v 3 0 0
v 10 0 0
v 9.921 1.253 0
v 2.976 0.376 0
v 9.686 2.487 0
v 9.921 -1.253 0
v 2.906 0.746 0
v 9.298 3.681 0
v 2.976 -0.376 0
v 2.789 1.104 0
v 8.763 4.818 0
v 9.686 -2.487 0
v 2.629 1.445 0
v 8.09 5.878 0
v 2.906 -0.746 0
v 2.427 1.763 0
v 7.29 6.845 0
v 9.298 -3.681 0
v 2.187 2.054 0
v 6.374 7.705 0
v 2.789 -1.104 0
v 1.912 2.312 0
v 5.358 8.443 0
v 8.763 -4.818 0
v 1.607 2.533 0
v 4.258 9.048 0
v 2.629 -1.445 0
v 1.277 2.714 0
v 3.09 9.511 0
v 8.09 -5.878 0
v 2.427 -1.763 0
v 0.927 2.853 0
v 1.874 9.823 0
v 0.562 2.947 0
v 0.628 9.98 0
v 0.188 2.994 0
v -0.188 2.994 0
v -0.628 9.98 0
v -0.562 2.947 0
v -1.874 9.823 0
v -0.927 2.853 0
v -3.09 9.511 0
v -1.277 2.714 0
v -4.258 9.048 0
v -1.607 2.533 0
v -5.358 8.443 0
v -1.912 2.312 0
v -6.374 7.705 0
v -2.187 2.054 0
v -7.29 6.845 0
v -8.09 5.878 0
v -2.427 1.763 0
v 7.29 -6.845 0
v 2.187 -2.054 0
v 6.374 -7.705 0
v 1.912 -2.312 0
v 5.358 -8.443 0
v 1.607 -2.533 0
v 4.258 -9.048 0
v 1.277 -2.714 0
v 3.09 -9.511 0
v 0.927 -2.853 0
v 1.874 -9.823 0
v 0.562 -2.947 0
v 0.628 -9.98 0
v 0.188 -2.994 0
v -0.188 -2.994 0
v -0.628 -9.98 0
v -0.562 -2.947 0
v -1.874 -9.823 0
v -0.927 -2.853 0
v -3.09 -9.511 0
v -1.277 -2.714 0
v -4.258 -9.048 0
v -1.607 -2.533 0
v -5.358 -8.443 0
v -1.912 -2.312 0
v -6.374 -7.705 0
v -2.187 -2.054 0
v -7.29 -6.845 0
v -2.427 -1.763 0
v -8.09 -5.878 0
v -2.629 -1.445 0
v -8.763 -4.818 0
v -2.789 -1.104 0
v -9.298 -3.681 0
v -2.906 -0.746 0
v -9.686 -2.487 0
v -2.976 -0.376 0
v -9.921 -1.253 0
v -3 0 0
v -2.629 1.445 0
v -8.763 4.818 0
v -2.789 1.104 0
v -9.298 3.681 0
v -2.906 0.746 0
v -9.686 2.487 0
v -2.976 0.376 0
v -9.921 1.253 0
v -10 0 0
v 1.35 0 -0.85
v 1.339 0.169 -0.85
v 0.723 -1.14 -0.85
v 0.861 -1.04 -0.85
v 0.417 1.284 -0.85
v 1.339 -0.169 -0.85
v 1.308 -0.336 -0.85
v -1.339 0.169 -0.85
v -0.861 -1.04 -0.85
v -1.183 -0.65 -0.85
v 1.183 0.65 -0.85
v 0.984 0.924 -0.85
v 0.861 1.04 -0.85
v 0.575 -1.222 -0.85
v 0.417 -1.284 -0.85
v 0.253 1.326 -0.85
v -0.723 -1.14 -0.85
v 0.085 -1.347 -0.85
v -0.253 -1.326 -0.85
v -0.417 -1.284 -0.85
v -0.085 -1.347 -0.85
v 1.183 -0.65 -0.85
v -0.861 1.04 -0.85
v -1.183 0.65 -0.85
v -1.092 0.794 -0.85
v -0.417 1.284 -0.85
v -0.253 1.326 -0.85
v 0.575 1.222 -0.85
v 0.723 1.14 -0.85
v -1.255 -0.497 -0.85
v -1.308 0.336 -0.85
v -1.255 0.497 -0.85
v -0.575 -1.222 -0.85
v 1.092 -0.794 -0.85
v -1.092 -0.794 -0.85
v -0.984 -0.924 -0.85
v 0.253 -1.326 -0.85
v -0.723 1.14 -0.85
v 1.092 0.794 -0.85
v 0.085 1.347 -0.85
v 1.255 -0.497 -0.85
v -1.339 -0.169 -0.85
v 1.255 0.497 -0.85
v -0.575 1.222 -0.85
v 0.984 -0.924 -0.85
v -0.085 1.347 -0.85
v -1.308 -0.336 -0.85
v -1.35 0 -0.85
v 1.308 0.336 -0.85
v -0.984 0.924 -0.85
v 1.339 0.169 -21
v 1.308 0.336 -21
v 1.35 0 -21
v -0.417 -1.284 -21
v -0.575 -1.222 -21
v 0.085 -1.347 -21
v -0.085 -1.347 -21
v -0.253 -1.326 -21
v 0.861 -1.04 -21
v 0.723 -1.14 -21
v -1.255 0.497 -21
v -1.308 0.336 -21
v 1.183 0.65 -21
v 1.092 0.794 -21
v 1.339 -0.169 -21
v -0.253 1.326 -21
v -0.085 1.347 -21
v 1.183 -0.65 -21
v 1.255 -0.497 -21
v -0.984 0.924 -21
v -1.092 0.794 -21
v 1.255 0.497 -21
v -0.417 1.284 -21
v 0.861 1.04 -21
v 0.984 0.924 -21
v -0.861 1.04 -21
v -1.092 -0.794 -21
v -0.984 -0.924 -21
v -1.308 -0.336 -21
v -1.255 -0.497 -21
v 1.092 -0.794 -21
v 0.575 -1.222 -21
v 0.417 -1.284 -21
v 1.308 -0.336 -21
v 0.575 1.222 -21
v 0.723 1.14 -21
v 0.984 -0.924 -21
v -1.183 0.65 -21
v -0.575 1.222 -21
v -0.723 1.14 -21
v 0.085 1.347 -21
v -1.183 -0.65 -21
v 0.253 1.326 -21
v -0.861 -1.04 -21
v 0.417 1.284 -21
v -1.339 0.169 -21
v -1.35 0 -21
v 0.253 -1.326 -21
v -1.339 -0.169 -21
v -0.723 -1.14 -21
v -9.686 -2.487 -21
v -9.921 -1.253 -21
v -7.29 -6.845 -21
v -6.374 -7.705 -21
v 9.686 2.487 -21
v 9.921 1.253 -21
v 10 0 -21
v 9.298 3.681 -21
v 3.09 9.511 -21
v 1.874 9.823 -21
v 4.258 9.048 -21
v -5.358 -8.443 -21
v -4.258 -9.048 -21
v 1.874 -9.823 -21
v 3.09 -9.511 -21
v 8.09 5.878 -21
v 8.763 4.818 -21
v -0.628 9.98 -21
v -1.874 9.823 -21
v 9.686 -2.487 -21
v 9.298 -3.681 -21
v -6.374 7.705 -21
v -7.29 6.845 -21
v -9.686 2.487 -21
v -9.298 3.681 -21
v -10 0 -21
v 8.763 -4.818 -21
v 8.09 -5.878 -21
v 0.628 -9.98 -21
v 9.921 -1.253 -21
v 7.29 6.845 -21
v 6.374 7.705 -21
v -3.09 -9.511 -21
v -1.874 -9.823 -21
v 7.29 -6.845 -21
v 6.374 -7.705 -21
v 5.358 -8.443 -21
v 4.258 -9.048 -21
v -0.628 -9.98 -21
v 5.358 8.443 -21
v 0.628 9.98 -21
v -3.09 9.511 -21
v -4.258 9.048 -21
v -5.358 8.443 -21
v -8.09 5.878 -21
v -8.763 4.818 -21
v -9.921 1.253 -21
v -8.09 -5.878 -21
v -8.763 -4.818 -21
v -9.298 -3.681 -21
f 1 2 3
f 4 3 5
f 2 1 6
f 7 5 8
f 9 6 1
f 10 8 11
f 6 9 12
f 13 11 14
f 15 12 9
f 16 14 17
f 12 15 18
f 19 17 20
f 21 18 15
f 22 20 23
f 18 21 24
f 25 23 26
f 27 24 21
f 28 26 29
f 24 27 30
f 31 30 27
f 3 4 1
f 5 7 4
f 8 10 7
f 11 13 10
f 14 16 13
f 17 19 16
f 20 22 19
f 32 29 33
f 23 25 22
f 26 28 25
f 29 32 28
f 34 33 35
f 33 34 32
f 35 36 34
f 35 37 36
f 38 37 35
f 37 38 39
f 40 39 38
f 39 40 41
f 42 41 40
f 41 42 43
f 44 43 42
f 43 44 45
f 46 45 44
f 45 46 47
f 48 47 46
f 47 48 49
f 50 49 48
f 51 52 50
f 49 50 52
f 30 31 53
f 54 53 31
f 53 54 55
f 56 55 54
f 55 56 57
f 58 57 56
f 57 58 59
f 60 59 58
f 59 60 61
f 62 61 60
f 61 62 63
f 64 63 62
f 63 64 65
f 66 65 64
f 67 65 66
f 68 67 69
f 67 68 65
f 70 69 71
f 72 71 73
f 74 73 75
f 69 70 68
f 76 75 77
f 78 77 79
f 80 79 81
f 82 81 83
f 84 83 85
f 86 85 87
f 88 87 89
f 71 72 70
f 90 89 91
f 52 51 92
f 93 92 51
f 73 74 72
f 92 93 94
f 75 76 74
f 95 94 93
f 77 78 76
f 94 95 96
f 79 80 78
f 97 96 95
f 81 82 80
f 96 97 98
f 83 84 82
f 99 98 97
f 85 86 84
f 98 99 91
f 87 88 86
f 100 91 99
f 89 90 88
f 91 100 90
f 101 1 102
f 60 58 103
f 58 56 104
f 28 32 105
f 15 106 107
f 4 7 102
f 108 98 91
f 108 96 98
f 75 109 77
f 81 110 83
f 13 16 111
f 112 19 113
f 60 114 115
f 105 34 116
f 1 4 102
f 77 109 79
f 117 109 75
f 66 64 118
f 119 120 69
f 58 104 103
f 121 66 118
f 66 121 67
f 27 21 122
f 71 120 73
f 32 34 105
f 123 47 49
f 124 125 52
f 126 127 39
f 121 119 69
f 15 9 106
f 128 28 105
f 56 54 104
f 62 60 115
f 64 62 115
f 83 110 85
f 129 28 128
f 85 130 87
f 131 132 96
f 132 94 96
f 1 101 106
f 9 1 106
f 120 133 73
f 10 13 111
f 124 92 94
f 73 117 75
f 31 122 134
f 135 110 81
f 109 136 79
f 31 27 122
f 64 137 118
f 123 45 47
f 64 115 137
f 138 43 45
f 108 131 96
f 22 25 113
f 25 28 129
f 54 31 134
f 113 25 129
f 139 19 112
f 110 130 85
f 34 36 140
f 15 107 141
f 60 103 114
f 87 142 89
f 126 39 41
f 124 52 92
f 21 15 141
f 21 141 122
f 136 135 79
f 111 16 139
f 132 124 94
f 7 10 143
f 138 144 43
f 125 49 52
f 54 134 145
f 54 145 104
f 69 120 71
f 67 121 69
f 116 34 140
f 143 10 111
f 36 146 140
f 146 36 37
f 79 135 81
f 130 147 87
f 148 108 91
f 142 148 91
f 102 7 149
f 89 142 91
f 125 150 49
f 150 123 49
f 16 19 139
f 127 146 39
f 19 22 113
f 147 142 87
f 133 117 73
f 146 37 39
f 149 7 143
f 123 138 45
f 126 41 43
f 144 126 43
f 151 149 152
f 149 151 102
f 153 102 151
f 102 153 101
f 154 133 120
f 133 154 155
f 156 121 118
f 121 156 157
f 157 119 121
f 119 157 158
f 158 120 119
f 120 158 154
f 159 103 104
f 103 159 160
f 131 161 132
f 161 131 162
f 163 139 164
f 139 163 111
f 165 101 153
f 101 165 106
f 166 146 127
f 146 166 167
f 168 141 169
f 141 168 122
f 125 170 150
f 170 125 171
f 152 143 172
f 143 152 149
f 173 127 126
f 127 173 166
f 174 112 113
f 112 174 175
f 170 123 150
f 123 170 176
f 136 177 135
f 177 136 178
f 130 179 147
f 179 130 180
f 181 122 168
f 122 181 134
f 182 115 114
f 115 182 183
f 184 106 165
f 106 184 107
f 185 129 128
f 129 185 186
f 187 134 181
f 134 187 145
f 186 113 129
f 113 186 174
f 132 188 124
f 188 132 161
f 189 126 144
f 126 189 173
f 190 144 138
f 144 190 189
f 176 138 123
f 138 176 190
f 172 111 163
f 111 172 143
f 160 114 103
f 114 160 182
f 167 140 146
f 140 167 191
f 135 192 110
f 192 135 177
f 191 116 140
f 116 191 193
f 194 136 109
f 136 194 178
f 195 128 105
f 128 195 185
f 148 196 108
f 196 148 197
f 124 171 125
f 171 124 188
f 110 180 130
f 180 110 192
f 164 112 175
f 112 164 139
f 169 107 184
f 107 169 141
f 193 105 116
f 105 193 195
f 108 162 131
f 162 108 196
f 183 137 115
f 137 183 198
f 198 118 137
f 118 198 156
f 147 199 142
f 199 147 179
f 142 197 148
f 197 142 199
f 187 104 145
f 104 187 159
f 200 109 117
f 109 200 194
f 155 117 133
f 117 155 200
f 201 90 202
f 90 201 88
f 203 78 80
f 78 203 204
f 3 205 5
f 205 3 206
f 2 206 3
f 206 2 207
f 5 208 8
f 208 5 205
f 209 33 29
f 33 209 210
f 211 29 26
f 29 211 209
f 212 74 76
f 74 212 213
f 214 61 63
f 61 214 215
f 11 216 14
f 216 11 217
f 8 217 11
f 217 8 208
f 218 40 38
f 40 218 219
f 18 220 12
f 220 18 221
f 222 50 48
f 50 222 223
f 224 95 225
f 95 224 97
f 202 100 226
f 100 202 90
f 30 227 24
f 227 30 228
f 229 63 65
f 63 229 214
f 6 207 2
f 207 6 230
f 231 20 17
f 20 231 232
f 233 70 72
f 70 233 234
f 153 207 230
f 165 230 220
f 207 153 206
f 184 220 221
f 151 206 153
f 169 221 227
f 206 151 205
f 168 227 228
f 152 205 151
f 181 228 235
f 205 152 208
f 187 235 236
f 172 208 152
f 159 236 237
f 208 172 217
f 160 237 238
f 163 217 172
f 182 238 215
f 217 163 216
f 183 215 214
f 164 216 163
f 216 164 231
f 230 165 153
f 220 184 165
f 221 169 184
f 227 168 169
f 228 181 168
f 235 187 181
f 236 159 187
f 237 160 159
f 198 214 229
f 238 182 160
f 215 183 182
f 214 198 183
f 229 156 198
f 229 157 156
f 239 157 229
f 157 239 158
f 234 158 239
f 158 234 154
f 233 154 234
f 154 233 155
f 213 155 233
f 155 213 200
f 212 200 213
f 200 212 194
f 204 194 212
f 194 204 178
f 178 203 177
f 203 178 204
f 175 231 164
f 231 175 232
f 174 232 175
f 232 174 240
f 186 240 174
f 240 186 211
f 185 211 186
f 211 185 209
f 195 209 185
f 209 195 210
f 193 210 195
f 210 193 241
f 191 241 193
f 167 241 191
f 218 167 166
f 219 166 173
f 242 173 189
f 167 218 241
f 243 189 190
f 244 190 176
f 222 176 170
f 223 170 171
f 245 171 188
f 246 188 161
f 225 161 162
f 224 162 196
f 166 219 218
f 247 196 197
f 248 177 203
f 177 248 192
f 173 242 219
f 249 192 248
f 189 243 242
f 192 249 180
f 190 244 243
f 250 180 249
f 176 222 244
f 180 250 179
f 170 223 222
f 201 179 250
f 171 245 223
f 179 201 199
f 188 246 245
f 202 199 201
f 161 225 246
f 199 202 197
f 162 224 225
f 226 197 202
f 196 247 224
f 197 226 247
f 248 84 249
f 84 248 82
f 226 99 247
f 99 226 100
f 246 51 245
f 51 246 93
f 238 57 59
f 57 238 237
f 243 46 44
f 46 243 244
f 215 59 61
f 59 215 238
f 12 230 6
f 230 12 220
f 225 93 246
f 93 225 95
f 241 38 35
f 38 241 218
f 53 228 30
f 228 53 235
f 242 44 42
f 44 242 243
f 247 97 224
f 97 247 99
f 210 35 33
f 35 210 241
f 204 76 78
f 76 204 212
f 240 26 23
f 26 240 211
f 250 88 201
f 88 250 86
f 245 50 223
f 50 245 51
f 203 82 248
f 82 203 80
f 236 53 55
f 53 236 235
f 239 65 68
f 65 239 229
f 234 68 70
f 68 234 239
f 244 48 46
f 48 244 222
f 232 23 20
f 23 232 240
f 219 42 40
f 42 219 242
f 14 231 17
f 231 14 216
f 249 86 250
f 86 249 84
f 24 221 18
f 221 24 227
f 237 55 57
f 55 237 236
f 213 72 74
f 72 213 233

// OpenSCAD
$fn = 50;

difference() {
	union() {
		translate(v = [0, 0, -21.0]) {
			cylinder(h = 21, r = 10.0);
		}
	}
	union() {
		translate(v = [0, 0, 0]) {
			rotate(a = [0, 0, 0]) {
				difference() {
					union() {
						translate(v = [0, 0, -24.0]) {
							cylinder(h = 24, r = 1.0);
						}
						translate(v = [0, 0, -0.85]) {
							cylinder(h = 0.85, r1 = 1.35, r2 = 3.0);
						}
						translate(v = [0, 0, -24.0]) {
							cylinder(h = 24, r = 1.35);
						}
						translate(v = [0, 0, -24.0]) {
							cylinder(h = 24, r = 1.0);
						}
					}
					union();
				}
			}
		}
	}
}
